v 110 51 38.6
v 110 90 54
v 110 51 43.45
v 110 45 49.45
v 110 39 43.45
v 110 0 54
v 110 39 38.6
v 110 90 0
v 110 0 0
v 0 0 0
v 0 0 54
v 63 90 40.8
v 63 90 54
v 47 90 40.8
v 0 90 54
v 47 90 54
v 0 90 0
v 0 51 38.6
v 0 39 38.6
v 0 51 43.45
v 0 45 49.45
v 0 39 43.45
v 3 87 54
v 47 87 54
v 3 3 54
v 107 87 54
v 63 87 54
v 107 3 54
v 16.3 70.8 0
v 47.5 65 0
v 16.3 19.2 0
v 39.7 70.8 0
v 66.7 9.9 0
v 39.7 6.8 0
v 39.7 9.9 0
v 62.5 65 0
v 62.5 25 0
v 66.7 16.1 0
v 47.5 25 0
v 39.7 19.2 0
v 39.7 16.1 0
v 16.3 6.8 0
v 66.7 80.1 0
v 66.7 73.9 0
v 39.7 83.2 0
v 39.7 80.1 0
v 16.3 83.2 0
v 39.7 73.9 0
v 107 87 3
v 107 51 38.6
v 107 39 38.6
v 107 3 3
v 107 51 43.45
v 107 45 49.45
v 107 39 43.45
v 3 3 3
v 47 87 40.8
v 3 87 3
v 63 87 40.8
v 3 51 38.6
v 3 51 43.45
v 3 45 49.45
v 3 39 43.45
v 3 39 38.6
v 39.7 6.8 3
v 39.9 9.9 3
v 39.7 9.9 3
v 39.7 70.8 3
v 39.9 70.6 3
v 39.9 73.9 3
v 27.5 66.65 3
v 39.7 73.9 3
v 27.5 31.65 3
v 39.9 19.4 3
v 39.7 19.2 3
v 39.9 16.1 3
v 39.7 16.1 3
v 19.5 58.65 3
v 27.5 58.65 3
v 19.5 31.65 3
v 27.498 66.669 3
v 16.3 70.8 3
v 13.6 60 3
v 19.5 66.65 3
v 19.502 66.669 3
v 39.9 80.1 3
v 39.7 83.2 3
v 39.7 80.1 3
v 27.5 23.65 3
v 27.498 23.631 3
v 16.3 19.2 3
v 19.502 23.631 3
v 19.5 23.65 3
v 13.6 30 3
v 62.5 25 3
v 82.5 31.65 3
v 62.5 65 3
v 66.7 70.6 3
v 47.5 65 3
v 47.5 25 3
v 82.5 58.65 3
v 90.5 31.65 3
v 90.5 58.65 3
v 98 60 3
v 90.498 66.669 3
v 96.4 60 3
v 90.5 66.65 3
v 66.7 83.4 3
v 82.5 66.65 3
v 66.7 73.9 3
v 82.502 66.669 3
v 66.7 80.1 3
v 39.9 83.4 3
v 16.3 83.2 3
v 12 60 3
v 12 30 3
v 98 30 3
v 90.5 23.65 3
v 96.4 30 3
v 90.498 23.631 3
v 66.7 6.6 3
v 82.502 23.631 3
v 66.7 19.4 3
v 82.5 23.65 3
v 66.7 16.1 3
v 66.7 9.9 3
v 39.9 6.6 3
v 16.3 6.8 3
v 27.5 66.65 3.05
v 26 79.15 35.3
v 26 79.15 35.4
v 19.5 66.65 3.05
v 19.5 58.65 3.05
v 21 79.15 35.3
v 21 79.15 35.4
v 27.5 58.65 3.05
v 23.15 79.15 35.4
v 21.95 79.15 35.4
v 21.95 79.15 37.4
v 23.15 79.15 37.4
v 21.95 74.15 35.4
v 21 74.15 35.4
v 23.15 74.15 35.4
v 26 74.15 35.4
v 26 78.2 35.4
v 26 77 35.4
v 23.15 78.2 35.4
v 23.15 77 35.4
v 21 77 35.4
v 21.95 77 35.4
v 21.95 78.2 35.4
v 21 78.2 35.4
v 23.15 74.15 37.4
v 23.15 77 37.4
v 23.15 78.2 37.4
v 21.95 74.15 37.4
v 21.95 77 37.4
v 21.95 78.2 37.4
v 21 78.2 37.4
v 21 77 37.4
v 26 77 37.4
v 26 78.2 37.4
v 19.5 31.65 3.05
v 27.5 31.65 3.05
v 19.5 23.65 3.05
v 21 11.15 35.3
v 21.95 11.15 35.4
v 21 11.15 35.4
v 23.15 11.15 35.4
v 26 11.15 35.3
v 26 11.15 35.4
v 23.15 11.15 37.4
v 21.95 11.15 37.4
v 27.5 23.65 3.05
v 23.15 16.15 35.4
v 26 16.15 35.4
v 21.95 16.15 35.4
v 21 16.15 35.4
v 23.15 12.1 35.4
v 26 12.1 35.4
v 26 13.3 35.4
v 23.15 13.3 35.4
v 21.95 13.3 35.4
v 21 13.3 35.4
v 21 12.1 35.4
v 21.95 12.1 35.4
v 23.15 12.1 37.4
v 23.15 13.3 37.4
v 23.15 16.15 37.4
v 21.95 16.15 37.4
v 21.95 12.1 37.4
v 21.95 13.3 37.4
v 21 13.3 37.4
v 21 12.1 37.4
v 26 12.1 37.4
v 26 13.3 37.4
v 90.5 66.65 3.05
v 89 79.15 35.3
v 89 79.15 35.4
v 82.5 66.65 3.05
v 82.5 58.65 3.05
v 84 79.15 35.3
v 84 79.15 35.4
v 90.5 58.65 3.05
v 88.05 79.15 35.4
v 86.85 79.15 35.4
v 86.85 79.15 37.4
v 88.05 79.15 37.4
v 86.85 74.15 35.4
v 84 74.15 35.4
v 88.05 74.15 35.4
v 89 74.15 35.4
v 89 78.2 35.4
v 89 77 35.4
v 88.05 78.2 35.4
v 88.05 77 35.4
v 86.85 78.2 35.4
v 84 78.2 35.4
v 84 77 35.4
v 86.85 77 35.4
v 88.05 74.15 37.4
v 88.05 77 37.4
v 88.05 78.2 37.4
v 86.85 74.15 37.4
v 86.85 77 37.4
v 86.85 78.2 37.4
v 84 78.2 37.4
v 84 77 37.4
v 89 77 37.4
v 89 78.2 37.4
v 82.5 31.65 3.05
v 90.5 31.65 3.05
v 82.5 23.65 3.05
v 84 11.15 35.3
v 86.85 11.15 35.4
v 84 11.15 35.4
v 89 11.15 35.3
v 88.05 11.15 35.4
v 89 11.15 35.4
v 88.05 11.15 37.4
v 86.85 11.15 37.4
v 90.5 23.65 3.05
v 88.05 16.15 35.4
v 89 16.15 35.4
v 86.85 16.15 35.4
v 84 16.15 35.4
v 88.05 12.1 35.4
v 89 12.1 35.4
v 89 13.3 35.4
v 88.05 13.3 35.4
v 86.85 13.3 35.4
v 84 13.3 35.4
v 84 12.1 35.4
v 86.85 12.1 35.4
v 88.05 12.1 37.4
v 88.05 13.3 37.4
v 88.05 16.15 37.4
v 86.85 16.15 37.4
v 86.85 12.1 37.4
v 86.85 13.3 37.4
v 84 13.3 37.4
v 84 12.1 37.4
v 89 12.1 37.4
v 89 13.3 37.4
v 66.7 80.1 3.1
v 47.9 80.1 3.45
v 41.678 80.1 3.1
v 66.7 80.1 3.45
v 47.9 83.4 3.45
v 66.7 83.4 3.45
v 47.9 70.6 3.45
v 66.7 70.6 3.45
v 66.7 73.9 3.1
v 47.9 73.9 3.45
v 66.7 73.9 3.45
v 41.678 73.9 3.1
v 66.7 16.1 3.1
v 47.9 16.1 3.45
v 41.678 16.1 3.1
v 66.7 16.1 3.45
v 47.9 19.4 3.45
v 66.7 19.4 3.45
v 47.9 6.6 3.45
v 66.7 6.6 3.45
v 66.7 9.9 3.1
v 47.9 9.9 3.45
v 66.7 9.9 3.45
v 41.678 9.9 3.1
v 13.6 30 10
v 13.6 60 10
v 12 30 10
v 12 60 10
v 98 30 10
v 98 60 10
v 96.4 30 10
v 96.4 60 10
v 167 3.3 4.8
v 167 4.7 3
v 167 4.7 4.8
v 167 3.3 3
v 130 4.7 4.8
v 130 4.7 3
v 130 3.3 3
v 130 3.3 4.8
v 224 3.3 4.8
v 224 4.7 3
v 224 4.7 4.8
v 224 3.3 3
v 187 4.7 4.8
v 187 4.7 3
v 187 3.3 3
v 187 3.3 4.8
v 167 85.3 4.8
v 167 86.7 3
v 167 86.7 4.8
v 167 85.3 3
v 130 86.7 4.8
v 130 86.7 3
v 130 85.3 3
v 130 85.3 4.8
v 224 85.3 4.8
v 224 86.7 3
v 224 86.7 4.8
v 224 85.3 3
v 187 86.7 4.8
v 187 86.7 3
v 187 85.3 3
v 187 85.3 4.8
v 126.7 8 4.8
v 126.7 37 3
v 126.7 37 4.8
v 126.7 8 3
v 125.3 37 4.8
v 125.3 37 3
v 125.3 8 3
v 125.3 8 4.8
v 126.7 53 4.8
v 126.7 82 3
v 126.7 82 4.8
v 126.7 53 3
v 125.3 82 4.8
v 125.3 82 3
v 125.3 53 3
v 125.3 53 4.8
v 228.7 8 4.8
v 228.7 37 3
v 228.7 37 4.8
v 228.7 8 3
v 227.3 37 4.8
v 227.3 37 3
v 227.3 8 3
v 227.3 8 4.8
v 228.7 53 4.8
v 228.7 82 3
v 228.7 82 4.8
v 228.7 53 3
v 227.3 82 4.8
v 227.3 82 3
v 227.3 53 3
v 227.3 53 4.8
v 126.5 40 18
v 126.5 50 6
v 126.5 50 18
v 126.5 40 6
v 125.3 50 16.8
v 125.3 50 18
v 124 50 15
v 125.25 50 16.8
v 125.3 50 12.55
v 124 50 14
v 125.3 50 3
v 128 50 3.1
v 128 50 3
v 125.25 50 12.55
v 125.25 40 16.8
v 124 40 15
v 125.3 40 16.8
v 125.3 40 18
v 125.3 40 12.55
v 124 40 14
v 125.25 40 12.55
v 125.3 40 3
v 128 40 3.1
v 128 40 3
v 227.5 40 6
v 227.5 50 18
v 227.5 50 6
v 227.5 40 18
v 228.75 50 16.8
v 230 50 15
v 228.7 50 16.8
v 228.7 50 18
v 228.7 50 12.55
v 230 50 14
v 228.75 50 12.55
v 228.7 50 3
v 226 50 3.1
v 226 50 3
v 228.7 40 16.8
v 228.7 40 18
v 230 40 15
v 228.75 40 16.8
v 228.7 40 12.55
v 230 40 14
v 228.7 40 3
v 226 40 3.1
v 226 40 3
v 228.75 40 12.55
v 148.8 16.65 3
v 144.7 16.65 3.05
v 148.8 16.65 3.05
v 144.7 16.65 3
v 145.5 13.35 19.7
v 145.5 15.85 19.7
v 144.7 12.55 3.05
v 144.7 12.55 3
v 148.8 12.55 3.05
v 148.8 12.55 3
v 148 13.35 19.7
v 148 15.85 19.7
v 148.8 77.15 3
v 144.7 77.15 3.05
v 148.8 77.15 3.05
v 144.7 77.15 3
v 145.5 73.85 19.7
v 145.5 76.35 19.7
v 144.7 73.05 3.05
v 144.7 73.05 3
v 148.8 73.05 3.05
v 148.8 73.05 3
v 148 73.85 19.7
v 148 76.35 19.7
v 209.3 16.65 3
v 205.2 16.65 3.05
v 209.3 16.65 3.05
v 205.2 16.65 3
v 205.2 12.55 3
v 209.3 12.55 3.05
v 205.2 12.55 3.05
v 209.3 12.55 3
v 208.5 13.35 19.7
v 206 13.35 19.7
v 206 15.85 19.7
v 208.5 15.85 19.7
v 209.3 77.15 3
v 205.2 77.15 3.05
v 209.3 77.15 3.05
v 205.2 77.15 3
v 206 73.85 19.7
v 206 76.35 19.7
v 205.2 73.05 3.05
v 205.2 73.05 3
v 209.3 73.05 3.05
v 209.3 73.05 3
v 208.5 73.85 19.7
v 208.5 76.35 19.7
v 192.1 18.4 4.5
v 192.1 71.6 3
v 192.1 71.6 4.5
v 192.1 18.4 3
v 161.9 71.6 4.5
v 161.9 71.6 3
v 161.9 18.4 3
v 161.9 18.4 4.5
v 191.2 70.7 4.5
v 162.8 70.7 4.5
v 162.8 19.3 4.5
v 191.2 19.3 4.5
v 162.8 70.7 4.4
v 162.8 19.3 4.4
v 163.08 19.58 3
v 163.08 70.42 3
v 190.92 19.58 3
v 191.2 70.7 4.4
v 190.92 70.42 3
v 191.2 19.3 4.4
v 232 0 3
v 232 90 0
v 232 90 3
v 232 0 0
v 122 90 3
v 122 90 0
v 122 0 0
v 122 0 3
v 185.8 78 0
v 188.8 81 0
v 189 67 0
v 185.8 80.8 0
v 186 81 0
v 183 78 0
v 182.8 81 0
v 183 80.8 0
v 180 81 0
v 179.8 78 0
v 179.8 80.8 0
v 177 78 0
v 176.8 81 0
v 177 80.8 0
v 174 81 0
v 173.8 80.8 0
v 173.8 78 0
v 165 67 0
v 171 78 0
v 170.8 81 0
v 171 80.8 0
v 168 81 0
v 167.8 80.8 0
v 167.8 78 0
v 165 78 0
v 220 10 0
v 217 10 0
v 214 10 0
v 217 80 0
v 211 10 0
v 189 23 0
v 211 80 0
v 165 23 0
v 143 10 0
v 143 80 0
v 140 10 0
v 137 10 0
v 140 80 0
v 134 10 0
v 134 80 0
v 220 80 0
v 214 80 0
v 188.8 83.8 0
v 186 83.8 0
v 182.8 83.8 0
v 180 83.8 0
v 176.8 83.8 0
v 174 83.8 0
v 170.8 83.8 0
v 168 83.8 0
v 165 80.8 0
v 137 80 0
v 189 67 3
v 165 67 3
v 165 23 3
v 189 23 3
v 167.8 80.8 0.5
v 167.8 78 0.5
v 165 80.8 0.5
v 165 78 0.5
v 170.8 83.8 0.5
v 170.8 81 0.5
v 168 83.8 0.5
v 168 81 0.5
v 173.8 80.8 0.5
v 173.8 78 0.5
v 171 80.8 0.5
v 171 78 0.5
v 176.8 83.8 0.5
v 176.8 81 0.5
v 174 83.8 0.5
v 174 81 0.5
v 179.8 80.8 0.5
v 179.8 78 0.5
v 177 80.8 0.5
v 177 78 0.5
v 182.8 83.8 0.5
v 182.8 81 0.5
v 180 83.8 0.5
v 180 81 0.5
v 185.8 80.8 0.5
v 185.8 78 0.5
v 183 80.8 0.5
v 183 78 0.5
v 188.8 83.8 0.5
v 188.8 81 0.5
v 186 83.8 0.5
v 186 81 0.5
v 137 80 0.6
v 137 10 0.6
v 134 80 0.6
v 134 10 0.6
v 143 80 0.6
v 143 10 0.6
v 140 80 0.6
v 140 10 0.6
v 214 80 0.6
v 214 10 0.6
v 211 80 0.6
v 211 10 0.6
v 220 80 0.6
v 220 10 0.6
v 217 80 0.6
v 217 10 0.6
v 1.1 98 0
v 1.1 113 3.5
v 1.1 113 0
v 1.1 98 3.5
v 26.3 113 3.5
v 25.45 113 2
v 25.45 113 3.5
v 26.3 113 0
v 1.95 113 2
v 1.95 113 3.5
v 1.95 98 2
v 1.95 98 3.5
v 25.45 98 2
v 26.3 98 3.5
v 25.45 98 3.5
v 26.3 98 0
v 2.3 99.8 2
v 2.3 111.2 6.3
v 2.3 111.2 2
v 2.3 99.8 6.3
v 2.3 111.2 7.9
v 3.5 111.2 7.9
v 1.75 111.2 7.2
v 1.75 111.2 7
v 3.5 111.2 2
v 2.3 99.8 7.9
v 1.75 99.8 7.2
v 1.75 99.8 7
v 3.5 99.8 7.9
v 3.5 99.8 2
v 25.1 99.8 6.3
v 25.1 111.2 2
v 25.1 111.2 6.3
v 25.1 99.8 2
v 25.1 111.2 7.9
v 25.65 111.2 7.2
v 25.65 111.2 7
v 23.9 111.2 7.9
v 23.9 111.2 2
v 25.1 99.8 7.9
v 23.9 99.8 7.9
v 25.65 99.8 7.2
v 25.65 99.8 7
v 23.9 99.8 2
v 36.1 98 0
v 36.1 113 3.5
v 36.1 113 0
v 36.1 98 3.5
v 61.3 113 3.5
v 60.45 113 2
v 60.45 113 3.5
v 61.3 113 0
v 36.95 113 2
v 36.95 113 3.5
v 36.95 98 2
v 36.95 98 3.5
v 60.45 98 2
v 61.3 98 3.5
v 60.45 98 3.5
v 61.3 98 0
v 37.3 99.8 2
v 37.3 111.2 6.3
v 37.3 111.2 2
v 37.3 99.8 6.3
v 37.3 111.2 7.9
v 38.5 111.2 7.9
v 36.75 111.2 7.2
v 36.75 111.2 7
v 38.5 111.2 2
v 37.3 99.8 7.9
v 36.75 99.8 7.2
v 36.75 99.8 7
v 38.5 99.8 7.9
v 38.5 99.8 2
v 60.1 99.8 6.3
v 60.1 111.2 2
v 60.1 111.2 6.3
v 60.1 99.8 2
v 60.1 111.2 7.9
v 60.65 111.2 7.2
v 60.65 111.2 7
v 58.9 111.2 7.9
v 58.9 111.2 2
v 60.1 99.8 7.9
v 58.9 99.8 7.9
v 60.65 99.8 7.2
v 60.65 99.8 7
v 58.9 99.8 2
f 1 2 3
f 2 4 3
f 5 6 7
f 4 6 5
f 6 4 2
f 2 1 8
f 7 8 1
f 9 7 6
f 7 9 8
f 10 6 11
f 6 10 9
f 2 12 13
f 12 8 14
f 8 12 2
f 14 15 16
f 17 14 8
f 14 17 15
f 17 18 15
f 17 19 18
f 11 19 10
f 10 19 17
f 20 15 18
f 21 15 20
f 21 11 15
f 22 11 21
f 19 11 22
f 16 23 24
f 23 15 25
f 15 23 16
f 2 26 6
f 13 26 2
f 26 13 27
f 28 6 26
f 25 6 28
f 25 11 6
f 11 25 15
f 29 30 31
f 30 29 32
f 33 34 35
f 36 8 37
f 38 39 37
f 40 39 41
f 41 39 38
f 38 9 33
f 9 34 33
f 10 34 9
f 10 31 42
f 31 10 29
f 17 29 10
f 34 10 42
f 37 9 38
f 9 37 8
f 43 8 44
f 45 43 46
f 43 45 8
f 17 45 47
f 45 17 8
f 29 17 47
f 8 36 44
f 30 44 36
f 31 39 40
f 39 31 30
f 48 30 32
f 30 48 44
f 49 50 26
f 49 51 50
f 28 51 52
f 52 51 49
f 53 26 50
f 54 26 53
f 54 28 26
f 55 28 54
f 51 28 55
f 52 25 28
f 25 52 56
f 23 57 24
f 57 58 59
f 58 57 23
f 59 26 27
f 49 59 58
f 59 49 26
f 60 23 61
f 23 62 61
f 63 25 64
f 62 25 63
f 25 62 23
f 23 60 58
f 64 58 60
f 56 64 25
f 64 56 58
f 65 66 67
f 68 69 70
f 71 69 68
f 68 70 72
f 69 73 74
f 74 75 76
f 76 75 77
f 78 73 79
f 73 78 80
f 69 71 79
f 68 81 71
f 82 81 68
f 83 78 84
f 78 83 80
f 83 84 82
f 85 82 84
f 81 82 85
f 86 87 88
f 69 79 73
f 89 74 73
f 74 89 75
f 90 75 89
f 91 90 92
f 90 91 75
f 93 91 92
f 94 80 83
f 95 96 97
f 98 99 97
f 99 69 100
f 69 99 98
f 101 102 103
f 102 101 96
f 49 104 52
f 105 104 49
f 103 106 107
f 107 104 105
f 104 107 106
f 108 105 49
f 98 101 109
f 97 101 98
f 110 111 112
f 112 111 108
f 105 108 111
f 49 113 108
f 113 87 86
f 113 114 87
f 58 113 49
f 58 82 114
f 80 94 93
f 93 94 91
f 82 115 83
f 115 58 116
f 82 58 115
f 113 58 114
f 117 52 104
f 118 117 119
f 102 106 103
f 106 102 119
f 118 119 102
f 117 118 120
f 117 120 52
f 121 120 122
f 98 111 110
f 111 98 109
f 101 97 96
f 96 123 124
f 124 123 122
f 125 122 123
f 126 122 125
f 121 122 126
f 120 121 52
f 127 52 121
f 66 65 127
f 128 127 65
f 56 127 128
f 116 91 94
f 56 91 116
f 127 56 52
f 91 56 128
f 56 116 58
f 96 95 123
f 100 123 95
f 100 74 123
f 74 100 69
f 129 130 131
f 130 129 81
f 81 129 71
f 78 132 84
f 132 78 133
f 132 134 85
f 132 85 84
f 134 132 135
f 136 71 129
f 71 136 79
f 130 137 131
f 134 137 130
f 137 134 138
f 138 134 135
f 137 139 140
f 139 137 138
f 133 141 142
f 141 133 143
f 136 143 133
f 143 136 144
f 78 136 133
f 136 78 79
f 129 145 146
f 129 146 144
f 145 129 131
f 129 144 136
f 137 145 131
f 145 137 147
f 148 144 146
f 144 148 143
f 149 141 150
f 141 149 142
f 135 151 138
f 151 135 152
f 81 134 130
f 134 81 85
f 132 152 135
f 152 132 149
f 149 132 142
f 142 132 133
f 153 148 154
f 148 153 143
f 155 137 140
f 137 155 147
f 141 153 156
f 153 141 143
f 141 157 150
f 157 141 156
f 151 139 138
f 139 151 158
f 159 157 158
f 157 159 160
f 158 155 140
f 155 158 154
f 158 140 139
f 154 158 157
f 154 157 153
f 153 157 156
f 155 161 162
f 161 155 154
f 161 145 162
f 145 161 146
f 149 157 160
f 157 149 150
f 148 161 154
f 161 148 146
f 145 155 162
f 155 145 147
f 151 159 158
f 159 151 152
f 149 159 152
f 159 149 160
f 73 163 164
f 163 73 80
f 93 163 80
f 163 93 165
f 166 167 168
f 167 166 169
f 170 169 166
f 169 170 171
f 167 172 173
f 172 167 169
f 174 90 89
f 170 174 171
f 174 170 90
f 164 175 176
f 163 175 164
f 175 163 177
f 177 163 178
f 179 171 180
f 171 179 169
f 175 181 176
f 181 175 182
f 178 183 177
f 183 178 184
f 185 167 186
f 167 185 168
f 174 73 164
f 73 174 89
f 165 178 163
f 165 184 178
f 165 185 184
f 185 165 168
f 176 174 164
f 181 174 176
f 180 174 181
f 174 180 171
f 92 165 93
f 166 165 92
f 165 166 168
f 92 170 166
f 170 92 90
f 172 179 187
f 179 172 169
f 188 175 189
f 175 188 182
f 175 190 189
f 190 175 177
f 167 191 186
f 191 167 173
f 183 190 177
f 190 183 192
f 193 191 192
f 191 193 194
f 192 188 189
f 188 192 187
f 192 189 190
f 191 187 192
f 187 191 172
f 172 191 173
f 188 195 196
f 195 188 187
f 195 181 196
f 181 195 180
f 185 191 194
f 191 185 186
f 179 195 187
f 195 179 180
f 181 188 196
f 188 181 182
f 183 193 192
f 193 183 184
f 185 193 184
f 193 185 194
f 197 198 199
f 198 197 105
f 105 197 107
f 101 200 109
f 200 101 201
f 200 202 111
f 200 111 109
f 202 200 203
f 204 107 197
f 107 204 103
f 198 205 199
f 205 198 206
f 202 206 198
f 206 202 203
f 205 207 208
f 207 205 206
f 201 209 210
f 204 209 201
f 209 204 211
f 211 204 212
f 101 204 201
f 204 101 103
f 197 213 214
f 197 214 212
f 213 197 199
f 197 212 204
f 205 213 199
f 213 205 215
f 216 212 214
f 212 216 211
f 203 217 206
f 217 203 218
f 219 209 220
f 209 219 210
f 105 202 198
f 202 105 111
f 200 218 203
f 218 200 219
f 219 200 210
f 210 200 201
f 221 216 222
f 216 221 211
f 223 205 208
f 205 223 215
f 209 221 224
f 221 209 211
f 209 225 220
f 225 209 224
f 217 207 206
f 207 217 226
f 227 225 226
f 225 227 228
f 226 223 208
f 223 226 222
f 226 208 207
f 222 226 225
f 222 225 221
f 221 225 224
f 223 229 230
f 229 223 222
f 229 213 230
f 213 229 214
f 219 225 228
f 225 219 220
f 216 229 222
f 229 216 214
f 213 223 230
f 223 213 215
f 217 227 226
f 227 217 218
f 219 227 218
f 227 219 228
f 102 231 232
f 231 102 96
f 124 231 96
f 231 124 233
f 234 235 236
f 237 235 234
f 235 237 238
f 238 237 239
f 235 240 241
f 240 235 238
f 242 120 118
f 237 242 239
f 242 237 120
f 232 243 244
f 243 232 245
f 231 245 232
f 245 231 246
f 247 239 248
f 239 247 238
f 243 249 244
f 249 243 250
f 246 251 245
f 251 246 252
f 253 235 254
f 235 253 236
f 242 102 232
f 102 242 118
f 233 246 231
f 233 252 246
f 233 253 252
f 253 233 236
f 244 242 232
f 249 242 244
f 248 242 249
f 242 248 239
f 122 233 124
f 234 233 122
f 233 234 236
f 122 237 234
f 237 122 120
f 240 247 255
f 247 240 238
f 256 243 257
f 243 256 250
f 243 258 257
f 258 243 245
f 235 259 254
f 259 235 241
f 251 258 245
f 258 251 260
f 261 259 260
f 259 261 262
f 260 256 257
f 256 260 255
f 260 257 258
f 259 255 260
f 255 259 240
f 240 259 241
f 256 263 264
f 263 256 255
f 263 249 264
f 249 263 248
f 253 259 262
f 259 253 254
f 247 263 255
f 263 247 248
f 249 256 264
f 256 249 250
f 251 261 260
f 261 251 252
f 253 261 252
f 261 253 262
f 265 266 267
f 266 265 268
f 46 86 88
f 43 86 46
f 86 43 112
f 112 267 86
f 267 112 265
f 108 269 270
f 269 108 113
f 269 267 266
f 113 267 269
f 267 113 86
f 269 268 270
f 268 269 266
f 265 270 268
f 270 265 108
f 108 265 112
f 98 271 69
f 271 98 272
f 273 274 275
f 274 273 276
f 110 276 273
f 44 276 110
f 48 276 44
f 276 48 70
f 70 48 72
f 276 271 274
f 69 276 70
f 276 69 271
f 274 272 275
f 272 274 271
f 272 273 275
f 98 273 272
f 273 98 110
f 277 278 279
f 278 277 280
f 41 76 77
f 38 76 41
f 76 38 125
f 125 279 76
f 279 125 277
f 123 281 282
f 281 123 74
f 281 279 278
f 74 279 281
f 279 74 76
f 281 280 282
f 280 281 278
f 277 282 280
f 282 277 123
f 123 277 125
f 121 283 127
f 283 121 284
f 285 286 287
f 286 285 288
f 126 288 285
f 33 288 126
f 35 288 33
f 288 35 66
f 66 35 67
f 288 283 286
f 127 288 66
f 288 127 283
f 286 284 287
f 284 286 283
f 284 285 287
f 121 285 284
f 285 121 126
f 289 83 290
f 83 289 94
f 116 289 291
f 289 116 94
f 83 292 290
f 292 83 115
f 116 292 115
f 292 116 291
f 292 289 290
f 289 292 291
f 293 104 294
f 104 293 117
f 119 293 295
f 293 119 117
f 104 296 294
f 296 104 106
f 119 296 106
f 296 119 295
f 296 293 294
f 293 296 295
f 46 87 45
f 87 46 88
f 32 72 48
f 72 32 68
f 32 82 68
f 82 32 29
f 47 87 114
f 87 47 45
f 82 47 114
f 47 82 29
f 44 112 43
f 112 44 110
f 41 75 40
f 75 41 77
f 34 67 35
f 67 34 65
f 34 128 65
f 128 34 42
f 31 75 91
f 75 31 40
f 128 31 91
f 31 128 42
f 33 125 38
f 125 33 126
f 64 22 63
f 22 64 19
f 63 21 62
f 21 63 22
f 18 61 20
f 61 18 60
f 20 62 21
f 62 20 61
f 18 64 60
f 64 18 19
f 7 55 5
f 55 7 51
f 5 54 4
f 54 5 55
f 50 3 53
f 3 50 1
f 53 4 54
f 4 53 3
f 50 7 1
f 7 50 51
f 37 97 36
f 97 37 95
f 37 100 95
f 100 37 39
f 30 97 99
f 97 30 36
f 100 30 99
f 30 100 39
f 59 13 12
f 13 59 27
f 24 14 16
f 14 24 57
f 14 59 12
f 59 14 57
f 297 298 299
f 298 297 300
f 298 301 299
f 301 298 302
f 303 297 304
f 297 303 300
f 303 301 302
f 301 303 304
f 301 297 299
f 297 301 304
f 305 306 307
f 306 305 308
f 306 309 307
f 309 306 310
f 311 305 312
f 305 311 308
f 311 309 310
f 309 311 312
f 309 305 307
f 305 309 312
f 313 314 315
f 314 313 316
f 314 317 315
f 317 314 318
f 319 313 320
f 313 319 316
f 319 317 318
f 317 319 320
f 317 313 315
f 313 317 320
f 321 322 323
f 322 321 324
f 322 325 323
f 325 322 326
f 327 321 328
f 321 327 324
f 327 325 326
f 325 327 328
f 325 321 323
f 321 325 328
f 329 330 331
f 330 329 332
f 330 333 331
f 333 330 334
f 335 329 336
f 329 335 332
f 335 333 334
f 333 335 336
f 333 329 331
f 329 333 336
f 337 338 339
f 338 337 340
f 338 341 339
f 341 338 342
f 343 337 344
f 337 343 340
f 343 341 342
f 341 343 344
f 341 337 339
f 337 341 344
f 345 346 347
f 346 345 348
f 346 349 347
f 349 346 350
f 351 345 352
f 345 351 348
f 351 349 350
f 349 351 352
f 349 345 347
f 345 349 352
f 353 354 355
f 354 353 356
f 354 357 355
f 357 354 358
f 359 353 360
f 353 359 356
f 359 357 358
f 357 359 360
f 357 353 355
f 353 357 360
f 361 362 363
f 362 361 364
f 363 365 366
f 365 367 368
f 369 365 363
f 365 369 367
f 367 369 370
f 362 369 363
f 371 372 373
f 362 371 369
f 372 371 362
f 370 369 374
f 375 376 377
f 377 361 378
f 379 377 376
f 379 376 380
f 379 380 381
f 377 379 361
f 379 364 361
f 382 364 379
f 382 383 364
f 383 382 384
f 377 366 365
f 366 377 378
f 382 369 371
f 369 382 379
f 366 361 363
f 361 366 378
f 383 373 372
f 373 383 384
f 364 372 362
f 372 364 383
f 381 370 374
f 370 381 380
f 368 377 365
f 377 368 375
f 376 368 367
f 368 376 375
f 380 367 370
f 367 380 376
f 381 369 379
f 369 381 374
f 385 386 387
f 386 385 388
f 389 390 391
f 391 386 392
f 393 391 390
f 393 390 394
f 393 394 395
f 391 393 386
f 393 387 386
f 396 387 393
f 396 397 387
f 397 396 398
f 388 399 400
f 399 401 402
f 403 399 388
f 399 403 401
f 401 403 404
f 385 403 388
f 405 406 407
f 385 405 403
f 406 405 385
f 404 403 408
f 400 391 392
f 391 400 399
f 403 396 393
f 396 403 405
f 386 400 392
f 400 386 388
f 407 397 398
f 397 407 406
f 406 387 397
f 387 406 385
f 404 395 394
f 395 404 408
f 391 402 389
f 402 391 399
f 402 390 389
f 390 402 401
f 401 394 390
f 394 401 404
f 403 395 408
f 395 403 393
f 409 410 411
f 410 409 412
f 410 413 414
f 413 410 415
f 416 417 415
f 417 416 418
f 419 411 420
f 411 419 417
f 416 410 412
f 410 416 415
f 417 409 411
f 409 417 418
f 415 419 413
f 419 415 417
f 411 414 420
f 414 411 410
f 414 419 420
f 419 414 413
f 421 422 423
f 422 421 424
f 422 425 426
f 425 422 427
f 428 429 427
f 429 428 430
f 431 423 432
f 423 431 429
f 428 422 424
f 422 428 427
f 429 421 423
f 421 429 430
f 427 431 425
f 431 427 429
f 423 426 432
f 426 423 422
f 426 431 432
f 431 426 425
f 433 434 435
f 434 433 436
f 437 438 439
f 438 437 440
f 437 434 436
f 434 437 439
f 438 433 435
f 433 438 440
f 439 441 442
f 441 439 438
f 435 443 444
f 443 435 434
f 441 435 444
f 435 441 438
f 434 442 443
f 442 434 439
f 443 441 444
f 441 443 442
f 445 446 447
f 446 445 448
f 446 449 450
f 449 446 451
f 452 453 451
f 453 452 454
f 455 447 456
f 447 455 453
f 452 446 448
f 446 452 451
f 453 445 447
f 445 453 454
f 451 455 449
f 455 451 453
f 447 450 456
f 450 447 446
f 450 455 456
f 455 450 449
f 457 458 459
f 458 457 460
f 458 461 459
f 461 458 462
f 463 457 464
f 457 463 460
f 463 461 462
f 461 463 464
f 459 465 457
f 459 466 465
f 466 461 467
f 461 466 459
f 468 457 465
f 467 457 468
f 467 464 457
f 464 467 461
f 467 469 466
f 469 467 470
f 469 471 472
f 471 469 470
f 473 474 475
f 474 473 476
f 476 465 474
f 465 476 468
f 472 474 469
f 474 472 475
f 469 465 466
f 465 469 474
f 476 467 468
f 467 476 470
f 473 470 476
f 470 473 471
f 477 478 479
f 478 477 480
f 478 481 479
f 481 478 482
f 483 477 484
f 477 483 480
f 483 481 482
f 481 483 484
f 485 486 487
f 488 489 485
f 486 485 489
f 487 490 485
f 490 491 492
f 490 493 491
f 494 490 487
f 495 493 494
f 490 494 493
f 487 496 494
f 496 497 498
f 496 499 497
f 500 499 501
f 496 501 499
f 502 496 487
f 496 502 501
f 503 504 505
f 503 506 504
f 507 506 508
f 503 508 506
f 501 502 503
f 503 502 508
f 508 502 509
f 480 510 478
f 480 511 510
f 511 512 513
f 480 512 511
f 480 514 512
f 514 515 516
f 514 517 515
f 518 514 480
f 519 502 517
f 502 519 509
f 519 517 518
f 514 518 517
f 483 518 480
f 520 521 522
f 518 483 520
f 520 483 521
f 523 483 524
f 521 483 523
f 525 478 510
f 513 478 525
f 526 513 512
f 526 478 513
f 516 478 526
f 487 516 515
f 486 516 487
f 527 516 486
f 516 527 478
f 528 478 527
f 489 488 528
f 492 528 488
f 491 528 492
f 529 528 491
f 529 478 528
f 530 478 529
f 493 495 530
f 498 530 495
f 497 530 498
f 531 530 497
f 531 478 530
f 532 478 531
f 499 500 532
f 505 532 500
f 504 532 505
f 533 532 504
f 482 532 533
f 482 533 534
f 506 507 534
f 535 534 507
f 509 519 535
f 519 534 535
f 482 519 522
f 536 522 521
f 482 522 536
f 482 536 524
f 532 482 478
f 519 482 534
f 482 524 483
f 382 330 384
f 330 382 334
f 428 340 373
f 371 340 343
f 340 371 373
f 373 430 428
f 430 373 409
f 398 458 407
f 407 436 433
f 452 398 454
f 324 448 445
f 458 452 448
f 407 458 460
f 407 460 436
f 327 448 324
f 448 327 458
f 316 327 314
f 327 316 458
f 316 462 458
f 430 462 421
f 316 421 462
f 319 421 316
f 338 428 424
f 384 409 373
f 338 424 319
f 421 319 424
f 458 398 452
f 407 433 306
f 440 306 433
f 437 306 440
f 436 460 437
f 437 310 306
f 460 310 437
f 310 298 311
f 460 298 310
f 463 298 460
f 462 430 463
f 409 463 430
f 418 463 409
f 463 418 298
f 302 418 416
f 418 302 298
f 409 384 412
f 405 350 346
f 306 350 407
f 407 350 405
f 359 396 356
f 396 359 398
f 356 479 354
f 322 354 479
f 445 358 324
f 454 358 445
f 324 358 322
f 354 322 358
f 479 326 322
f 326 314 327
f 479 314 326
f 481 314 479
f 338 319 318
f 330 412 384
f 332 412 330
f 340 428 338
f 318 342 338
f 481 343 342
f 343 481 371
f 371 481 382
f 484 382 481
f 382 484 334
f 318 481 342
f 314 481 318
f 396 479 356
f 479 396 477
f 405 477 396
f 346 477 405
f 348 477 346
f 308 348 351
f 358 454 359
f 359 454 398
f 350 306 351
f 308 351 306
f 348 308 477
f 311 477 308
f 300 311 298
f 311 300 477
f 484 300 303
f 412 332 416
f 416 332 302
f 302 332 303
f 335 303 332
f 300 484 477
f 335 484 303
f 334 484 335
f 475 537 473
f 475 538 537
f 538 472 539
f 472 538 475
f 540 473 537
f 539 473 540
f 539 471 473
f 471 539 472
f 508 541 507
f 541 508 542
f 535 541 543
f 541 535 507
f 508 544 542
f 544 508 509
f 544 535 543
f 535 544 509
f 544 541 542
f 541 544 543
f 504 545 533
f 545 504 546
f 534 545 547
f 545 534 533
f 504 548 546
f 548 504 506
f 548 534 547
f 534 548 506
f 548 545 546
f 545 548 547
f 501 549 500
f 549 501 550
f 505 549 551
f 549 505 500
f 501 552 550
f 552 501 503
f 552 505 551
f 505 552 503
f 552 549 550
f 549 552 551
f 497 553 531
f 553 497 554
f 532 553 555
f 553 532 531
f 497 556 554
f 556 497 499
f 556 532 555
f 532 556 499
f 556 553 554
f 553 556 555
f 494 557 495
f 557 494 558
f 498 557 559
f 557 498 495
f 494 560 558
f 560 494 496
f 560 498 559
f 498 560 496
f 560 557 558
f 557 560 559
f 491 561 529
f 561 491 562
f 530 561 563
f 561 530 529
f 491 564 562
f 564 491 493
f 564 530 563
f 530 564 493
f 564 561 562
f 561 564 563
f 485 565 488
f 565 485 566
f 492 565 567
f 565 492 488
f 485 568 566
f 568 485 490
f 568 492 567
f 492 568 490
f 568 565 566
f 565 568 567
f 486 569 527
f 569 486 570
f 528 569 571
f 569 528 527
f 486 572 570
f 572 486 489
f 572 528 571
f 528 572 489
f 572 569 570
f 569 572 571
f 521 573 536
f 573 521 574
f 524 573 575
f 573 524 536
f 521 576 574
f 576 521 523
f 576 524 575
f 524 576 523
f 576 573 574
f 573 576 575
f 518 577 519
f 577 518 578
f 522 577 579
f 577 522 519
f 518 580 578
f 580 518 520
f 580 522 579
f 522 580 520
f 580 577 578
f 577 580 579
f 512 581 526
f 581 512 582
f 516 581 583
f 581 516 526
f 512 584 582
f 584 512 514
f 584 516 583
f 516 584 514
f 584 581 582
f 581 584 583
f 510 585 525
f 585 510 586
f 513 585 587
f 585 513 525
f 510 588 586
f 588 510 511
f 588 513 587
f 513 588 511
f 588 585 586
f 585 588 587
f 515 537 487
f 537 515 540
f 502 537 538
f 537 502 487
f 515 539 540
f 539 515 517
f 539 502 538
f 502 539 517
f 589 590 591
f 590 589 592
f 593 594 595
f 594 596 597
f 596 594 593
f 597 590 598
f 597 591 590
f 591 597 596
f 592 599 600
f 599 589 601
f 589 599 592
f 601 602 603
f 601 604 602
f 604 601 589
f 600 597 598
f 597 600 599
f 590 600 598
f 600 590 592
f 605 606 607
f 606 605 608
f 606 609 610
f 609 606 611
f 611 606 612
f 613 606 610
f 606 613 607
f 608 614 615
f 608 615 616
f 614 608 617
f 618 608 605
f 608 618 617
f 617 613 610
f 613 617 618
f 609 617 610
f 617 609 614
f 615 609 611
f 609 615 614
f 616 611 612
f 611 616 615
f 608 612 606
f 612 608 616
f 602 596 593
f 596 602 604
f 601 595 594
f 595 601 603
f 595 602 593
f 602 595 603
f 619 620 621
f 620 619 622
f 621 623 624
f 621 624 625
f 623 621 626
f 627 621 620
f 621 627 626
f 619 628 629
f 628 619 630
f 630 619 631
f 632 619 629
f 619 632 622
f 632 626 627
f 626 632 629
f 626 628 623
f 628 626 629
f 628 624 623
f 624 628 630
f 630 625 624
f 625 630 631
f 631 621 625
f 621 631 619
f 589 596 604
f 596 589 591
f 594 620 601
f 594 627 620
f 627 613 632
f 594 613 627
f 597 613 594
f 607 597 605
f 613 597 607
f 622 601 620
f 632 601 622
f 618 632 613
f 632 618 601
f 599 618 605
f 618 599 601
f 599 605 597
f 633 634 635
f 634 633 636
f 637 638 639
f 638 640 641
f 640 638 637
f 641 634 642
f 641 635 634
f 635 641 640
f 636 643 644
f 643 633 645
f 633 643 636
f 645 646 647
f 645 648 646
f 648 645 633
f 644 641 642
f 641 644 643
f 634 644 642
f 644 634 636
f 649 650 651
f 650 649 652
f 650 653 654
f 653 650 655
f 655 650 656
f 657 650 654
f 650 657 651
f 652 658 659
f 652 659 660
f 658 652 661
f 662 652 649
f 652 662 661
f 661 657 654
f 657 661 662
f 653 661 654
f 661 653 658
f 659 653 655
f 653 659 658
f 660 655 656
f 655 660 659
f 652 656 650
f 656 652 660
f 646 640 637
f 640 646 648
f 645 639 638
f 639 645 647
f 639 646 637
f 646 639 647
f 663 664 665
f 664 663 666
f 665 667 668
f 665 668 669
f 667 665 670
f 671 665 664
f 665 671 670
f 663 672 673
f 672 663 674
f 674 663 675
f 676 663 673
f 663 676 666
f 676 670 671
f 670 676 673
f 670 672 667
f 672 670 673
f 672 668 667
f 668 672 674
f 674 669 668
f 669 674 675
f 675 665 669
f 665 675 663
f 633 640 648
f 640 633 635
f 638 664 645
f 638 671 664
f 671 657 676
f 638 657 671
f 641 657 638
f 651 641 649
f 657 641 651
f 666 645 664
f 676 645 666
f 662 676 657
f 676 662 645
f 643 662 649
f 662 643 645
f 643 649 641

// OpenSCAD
// Elektronikgehäuse v3 (wie v2, Andockung mit weniger Spiel + Keilrampen).
// pinewood_v3_shared.scad im selben Ordner lassen.
include <pinewood_v3_shared.scad>
piece="print_layout"; // base | lid | lock | preview | print_layout
if(piece=="base") base_print();
else if(piece=="lid") lid_print();
else if(piece=="lock") lock_print();
else if(piece=="preview") { housing_base(); housing_lid(); %board_preview(); }
else if(piece=="print_layout") { print_layout(); translate([0,box_height+8,0]) lock_print(); translate([35,box_height+8,0]) lock_print(); }
else assert(false,"Unknown piece");
